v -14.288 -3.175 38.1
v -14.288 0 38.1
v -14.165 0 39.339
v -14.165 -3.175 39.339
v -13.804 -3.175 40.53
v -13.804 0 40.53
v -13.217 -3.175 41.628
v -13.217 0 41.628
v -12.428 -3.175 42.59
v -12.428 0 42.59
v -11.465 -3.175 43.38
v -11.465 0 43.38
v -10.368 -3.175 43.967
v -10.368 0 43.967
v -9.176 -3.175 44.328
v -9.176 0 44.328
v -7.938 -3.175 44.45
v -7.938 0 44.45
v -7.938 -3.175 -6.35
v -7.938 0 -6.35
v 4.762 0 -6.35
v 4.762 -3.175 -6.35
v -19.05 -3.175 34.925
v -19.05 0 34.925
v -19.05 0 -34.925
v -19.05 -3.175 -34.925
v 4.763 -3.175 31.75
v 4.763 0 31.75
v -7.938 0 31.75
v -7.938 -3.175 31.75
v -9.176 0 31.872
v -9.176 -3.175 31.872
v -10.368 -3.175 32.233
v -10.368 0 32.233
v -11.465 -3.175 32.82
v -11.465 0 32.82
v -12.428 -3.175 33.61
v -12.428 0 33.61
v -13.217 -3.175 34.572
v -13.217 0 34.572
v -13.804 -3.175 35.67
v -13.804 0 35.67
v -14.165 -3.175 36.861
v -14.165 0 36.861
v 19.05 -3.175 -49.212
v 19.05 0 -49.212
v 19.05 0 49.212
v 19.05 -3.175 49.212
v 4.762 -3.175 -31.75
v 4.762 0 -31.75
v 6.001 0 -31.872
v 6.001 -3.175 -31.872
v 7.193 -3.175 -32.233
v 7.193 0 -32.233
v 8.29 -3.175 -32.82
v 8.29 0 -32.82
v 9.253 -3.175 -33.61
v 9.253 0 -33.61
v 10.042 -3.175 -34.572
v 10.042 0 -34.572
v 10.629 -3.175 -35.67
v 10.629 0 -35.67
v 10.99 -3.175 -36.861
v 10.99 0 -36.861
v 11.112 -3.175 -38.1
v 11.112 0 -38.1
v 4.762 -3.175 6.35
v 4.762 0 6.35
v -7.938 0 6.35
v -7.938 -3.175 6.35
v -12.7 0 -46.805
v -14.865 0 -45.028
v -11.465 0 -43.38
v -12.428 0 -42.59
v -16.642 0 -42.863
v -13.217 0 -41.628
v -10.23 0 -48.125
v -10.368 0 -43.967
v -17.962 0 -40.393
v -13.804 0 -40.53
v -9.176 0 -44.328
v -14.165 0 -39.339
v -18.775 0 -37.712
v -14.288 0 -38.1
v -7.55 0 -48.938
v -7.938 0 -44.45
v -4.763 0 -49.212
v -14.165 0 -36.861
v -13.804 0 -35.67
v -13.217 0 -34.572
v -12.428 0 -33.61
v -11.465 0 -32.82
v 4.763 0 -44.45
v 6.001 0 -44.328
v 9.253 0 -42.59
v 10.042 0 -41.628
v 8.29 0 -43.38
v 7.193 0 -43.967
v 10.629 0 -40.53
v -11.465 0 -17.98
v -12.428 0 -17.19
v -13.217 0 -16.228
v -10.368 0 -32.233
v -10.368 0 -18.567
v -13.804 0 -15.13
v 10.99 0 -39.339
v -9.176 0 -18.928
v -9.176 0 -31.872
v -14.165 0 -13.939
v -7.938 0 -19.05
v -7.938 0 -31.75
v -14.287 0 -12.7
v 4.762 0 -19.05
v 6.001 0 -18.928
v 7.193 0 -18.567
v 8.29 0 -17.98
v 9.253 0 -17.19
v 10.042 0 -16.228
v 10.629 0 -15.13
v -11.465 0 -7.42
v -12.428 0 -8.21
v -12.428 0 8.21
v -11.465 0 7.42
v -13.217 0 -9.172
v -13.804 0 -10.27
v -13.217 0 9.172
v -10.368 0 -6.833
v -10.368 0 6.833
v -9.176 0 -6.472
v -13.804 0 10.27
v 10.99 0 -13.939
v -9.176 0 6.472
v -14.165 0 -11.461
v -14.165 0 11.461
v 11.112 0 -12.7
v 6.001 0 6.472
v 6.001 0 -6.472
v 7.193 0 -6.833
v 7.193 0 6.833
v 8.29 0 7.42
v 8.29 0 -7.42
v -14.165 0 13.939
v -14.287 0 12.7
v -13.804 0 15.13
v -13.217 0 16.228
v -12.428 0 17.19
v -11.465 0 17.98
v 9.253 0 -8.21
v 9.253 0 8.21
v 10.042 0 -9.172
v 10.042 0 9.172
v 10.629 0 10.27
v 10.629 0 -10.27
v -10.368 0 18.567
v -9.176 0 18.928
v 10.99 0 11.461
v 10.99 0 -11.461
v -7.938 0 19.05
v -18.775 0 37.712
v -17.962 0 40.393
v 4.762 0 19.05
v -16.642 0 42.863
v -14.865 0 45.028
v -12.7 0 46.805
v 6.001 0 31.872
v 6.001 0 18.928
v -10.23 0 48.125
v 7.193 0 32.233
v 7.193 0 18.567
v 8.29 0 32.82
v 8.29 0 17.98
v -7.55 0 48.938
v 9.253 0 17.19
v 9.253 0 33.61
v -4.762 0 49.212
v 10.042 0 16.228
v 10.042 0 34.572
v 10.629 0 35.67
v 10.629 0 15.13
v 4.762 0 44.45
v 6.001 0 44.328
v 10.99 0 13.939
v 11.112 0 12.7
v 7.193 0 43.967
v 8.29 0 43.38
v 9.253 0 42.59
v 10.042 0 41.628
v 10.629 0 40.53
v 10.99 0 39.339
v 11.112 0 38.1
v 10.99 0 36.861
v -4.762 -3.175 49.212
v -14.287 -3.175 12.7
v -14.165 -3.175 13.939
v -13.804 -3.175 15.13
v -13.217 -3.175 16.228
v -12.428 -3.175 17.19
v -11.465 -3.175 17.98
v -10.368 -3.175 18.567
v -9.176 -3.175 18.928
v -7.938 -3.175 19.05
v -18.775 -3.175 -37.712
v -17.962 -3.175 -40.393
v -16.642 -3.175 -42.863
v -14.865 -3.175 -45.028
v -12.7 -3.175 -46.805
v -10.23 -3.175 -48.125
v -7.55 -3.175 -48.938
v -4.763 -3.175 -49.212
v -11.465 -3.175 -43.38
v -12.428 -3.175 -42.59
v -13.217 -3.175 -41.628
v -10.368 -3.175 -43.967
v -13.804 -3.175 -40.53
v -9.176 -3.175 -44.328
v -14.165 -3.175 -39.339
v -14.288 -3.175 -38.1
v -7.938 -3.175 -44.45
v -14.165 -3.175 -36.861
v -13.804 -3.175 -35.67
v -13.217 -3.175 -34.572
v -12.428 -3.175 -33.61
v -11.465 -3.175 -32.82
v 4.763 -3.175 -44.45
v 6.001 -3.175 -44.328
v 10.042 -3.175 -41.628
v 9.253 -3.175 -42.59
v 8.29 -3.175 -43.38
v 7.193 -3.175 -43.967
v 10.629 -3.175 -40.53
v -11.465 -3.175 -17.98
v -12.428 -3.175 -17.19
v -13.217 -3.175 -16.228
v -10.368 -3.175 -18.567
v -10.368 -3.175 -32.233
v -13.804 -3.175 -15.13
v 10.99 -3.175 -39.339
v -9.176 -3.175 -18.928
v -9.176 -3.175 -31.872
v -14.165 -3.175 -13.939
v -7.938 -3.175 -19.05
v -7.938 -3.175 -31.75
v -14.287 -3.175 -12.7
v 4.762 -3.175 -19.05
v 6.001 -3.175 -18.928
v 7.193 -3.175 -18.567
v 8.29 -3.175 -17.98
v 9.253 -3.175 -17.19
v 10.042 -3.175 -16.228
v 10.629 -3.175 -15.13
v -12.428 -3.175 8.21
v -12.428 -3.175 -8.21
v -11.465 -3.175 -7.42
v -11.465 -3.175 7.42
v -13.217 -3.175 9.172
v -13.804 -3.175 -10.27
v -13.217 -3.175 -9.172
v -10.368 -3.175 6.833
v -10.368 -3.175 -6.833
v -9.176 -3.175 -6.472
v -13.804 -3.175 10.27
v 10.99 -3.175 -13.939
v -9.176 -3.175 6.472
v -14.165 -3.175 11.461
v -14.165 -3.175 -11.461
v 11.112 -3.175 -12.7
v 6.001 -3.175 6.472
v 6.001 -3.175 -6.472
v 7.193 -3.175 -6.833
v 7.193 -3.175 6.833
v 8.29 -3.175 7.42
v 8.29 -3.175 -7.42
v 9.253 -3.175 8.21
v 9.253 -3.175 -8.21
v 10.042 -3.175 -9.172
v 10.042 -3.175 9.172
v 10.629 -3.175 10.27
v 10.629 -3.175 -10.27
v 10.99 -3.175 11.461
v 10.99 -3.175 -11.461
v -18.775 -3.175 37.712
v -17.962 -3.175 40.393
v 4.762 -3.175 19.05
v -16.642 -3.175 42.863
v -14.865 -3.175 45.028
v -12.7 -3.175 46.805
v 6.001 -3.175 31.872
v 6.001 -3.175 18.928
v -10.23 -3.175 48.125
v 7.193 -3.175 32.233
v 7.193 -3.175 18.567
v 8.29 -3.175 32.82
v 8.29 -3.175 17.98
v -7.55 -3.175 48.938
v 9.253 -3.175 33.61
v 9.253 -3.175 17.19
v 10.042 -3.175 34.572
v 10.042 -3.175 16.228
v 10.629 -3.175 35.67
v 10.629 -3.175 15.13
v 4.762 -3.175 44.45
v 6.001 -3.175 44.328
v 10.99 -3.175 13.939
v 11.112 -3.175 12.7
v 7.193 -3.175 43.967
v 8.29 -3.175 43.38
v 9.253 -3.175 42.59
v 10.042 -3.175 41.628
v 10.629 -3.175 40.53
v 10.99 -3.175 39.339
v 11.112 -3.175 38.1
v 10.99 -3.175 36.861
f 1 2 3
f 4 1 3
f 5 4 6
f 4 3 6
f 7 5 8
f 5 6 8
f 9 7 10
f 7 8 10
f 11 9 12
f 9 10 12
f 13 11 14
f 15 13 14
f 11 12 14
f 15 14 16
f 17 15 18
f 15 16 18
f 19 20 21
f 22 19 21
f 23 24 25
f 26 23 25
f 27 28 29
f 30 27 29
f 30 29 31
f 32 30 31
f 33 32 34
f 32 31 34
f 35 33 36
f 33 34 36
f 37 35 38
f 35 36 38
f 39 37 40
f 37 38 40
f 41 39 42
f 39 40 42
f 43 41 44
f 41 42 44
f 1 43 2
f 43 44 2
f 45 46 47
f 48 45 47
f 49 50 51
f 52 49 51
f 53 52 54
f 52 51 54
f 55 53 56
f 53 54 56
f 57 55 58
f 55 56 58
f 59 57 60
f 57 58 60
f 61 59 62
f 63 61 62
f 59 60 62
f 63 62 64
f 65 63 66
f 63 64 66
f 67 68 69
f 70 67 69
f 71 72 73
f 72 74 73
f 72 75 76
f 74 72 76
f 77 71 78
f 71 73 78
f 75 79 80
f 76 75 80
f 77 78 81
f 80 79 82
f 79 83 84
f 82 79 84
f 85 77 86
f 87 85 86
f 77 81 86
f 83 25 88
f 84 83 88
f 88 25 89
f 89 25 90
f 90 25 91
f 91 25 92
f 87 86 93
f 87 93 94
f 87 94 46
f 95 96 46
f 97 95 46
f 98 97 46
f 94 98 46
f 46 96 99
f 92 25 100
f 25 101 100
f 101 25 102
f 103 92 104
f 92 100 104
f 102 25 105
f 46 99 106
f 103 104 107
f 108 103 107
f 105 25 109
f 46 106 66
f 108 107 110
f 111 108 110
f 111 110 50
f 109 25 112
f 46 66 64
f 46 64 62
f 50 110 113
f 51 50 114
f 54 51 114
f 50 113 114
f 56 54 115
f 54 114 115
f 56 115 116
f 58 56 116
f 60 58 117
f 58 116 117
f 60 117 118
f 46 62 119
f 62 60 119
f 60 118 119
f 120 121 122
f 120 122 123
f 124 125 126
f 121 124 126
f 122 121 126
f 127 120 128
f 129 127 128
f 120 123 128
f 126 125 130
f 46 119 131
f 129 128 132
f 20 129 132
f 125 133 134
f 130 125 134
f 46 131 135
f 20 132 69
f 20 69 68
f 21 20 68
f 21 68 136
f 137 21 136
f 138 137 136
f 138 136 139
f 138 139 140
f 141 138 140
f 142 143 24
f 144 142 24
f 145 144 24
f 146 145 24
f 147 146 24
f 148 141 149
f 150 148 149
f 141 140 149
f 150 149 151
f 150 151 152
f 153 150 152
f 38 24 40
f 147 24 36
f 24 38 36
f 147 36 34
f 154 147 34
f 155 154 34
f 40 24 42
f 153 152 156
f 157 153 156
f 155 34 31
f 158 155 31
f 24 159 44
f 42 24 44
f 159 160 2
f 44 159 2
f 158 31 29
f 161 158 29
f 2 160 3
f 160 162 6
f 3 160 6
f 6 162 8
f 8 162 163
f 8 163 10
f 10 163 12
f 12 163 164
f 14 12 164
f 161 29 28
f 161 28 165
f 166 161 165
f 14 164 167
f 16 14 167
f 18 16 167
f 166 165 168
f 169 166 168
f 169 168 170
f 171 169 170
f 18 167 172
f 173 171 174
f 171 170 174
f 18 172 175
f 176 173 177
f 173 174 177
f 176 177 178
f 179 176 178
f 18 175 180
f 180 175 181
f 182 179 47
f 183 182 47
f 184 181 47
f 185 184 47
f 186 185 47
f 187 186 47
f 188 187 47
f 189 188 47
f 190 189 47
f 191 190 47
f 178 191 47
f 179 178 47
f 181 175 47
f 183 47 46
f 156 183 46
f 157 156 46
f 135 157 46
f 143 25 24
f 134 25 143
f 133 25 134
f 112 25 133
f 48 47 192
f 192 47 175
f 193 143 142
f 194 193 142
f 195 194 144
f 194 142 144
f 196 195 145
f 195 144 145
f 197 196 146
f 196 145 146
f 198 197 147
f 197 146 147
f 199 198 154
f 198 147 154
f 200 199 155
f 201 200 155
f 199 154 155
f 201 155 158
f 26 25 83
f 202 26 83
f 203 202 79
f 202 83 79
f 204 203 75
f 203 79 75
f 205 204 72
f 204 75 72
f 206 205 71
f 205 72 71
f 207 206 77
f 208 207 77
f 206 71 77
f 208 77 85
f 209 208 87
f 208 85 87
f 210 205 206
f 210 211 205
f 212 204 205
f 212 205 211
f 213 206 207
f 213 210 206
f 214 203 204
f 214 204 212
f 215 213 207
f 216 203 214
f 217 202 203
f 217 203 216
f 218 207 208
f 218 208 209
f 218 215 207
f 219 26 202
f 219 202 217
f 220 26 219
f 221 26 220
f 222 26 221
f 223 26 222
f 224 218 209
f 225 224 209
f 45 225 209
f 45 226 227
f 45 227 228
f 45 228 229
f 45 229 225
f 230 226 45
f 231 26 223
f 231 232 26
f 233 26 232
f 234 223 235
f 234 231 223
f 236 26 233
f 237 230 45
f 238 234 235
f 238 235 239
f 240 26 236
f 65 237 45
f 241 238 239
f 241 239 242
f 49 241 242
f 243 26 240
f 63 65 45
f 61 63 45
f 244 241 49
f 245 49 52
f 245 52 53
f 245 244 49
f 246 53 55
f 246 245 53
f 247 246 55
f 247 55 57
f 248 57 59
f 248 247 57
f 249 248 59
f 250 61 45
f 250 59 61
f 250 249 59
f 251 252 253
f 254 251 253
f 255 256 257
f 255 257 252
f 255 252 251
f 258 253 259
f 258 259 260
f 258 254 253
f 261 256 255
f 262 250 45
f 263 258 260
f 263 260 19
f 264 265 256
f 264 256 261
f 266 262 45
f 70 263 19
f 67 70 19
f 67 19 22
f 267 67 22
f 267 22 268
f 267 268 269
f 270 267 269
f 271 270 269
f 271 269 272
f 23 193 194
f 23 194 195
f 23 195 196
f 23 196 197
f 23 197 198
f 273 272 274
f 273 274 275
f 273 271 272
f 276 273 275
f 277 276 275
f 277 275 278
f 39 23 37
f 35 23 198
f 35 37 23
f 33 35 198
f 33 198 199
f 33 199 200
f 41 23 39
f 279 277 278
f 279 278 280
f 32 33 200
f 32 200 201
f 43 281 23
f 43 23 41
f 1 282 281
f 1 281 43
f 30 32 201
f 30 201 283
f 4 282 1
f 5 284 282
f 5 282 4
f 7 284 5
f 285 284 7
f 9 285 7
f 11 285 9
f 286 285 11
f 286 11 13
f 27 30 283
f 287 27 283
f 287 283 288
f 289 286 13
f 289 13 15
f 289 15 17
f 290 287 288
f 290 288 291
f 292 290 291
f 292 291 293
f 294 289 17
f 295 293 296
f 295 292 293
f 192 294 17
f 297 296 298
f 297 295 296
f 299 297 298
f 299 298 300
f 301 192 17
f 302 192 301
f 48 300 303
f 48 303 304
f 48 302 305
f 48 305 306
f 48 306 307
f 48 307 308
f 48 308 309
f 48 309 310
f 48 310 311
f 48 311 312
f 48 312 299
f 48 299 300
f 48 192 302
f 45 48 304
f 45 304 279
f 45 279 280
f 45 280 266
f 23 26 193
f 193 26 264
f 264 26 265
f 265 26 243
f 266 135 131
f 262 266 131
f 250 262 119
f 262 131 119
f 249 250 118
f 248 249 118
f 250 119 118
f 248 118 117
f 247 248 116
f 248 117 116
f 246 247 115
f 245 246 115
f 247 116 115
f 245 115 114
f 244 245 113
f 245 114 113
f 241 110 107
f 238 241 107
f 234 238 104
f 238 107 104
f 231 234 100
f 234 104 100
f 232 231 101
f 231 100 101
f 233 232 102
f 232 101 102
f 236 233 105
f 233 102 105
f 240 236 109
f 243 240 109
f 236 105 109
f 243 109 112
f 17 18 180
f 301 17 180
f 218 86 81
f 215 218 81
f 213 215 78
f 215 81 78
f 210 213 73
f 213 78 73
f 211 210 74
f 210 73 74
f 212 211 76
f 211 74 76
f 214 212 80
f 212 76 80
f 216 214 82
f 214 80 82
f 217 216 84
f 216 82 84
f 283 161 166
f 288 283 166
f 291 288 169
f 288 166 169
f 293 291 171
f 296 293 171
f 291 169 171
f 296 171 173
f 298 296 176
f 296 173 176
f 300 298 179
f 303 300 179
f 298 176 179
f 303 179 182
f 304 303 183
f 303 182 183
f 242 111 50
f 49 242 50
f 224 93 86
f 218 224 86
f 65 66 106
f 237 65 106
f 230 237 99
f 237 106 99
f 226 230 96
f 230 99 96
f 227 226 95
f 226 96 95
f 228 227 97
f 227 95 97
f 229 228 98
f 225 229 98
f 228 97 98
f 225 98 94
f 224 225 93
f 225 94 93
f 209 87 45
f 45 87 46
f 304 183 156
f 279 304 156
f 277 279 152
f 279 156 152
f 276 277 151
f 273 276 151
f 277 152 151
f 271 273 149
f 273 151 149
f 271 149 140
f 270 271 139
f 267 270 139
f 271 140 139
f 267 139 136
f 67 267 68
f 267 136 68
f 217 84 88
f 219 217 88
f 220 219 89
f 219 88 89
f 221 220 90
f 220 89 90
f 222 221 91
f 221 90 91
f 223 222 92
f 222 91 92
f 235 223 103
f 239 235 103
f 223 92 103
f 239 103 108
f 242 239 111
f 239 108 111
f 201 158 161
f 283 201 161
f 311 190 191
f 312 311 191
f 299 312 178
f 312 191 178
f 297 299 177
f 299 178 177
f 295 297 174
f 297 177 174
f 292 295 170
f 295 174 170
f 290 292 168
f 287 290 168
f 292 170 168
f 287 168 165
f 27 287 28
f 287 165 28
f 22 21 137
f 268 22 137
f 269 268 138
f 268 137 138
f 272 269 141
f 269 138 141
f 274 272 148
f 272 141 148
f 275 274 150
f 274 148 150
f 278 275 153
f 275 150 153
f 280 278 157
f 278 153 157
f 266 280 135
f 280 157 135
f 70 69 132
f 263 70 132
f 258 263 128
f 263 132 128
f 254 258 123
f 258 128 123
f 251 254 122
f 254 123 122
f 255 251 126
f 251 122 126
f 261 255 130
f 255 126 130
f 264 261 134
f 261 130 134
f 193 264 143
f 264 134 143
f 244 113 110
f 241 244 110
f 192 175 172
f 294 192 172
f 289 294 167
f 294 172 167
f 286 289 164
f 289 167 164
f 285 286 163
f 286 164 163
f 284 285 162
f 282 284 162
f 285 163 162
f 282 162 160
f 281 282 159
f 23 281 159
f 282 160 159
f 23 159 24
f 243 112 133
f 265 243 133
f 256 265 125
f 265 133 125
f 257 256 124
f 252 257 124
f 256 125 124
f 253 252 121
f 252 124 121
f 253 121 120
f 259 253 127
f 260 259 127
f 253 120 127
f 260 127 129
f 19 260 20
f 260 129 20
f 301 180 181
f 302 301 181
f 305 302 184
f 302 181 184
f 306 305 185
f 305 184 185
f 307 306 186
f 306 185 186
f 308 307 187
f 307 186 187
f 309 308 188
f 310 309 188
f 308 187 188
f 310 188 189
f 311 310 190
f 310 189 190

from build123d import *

# Parameters (mm, degrees)
F1_DEPTH = 3.175


with BuildPart() as f1:
    # F0 (on Front) → F1 (new body)
    with BuildSketch(Plane.XZ):
        with BuildLine():
            Line((-4.7625, -49.2125), (19.05, -49.2125))
            Line((19.05, -49.2125), (19.05, 49.2125))
            Line((19.05, 49.2125), (-4.7625, 49.2125))
            ThreePointArc((-4.7625, 49.2125), (-14.865288, 45.027788), (-19.05, 34.925))
            Line((-19.05, 34.925), (-19.05, -34.925))
            ThreePointArc((-19.05, -34.925), (-14.865288, -45.027788), (-4.7625, -49.2125))
        make_face()
        with BuildLine():
            ThreePointArc((11.1125, -38.1), (9.252628, -42.590128), (4.7625, -44.45))
            Line((4.7625, -44.45), (-7.9375, -44.45))
            ThreePointArc((-7.9375, -44.45), (-12.427628, -42.590128), (-14.2875, -38.1))
            ThreePointArc((-14.2875, -38.1), (-12.427628, -33.609872), (-7.9375, -31.75))
            Line((-7.9375, -31.75), (4.7625, -31.75))
            ThreePointArc((4.7625, -31.75), (9.252628, -33.609872), (11.1125, -38.1))
        make_face(mode=Mode.SUBTRACT)
        with BuildLine():
            Line((-7.9375, -6.35), (4.7625, -6.35))
            ThreePointArc((4.7625, -6.35), (9.252628, -8.209872), (11.1125, -12.7))
            ThreePointArc((11.1125, -12.7), (9.252628, -17.190128), (4.7625, -19.05))
            Line((4.7625, -19.05), (-7.9375, -19.05))
            ThreePointArc((-7.9375, -19.05), (-12.427628, -17.190128), (-14.2875, -12.7))
            ThreePointArc((-14.2875, -12.7), (-12.427628, -8.209872), (-7.9375, -6.35))
        make_face(mode=Mode.SUBTRACT)
        with BuildLine():
            Line((-7.9375, 19.05), (4.7625, 19.05))
            ThreePointArc((4.7625, 19.05), (9.252628, 17.190128), (11.1125, 12.7))
            ThreePointArc((11.1125, 12.7), (9.252628, 8.209872), (4.7625, 6.35))
            Line((4.7625, 6.35), (-7.9375, 6.35))
            ThreePointArc((-7.9375, 6.35), (-12.427628, 8.209872), (-14.2875, 12.7))
            ThreePointArc((-14.2875, 12.7), (-12.427628, 17.190128), (-7.9375, 19.05))
        make_face(mode=Mode.SUBTRACT)
        with BuildLine():
            Line((-7.9375, 44.45), (4.7625, 44.45))
            ThreePointArc((4.7625, 44.45), (9.252628, 42.590128), (11.1125, 38.1))
            ThreePointArc((11.1125, 38.1), (9.252628, 33.609872), (4.7625, 31.75))
            Line((4.7625, 31.75), (-7.9375, 31.75))
            ThreePointArc((-7.9375, 31.75), (-12.427628, 33.609872), (-14.2875, 38.1))
            ThreePointArc((-14.2875, 38.1), (-12.427628, 42.590128), (-7.9375, 44.45))
        make_face(mode=Mode.SUBTRACT)
    extrude(amount=F1_DEPTH)


solid = f1.part
